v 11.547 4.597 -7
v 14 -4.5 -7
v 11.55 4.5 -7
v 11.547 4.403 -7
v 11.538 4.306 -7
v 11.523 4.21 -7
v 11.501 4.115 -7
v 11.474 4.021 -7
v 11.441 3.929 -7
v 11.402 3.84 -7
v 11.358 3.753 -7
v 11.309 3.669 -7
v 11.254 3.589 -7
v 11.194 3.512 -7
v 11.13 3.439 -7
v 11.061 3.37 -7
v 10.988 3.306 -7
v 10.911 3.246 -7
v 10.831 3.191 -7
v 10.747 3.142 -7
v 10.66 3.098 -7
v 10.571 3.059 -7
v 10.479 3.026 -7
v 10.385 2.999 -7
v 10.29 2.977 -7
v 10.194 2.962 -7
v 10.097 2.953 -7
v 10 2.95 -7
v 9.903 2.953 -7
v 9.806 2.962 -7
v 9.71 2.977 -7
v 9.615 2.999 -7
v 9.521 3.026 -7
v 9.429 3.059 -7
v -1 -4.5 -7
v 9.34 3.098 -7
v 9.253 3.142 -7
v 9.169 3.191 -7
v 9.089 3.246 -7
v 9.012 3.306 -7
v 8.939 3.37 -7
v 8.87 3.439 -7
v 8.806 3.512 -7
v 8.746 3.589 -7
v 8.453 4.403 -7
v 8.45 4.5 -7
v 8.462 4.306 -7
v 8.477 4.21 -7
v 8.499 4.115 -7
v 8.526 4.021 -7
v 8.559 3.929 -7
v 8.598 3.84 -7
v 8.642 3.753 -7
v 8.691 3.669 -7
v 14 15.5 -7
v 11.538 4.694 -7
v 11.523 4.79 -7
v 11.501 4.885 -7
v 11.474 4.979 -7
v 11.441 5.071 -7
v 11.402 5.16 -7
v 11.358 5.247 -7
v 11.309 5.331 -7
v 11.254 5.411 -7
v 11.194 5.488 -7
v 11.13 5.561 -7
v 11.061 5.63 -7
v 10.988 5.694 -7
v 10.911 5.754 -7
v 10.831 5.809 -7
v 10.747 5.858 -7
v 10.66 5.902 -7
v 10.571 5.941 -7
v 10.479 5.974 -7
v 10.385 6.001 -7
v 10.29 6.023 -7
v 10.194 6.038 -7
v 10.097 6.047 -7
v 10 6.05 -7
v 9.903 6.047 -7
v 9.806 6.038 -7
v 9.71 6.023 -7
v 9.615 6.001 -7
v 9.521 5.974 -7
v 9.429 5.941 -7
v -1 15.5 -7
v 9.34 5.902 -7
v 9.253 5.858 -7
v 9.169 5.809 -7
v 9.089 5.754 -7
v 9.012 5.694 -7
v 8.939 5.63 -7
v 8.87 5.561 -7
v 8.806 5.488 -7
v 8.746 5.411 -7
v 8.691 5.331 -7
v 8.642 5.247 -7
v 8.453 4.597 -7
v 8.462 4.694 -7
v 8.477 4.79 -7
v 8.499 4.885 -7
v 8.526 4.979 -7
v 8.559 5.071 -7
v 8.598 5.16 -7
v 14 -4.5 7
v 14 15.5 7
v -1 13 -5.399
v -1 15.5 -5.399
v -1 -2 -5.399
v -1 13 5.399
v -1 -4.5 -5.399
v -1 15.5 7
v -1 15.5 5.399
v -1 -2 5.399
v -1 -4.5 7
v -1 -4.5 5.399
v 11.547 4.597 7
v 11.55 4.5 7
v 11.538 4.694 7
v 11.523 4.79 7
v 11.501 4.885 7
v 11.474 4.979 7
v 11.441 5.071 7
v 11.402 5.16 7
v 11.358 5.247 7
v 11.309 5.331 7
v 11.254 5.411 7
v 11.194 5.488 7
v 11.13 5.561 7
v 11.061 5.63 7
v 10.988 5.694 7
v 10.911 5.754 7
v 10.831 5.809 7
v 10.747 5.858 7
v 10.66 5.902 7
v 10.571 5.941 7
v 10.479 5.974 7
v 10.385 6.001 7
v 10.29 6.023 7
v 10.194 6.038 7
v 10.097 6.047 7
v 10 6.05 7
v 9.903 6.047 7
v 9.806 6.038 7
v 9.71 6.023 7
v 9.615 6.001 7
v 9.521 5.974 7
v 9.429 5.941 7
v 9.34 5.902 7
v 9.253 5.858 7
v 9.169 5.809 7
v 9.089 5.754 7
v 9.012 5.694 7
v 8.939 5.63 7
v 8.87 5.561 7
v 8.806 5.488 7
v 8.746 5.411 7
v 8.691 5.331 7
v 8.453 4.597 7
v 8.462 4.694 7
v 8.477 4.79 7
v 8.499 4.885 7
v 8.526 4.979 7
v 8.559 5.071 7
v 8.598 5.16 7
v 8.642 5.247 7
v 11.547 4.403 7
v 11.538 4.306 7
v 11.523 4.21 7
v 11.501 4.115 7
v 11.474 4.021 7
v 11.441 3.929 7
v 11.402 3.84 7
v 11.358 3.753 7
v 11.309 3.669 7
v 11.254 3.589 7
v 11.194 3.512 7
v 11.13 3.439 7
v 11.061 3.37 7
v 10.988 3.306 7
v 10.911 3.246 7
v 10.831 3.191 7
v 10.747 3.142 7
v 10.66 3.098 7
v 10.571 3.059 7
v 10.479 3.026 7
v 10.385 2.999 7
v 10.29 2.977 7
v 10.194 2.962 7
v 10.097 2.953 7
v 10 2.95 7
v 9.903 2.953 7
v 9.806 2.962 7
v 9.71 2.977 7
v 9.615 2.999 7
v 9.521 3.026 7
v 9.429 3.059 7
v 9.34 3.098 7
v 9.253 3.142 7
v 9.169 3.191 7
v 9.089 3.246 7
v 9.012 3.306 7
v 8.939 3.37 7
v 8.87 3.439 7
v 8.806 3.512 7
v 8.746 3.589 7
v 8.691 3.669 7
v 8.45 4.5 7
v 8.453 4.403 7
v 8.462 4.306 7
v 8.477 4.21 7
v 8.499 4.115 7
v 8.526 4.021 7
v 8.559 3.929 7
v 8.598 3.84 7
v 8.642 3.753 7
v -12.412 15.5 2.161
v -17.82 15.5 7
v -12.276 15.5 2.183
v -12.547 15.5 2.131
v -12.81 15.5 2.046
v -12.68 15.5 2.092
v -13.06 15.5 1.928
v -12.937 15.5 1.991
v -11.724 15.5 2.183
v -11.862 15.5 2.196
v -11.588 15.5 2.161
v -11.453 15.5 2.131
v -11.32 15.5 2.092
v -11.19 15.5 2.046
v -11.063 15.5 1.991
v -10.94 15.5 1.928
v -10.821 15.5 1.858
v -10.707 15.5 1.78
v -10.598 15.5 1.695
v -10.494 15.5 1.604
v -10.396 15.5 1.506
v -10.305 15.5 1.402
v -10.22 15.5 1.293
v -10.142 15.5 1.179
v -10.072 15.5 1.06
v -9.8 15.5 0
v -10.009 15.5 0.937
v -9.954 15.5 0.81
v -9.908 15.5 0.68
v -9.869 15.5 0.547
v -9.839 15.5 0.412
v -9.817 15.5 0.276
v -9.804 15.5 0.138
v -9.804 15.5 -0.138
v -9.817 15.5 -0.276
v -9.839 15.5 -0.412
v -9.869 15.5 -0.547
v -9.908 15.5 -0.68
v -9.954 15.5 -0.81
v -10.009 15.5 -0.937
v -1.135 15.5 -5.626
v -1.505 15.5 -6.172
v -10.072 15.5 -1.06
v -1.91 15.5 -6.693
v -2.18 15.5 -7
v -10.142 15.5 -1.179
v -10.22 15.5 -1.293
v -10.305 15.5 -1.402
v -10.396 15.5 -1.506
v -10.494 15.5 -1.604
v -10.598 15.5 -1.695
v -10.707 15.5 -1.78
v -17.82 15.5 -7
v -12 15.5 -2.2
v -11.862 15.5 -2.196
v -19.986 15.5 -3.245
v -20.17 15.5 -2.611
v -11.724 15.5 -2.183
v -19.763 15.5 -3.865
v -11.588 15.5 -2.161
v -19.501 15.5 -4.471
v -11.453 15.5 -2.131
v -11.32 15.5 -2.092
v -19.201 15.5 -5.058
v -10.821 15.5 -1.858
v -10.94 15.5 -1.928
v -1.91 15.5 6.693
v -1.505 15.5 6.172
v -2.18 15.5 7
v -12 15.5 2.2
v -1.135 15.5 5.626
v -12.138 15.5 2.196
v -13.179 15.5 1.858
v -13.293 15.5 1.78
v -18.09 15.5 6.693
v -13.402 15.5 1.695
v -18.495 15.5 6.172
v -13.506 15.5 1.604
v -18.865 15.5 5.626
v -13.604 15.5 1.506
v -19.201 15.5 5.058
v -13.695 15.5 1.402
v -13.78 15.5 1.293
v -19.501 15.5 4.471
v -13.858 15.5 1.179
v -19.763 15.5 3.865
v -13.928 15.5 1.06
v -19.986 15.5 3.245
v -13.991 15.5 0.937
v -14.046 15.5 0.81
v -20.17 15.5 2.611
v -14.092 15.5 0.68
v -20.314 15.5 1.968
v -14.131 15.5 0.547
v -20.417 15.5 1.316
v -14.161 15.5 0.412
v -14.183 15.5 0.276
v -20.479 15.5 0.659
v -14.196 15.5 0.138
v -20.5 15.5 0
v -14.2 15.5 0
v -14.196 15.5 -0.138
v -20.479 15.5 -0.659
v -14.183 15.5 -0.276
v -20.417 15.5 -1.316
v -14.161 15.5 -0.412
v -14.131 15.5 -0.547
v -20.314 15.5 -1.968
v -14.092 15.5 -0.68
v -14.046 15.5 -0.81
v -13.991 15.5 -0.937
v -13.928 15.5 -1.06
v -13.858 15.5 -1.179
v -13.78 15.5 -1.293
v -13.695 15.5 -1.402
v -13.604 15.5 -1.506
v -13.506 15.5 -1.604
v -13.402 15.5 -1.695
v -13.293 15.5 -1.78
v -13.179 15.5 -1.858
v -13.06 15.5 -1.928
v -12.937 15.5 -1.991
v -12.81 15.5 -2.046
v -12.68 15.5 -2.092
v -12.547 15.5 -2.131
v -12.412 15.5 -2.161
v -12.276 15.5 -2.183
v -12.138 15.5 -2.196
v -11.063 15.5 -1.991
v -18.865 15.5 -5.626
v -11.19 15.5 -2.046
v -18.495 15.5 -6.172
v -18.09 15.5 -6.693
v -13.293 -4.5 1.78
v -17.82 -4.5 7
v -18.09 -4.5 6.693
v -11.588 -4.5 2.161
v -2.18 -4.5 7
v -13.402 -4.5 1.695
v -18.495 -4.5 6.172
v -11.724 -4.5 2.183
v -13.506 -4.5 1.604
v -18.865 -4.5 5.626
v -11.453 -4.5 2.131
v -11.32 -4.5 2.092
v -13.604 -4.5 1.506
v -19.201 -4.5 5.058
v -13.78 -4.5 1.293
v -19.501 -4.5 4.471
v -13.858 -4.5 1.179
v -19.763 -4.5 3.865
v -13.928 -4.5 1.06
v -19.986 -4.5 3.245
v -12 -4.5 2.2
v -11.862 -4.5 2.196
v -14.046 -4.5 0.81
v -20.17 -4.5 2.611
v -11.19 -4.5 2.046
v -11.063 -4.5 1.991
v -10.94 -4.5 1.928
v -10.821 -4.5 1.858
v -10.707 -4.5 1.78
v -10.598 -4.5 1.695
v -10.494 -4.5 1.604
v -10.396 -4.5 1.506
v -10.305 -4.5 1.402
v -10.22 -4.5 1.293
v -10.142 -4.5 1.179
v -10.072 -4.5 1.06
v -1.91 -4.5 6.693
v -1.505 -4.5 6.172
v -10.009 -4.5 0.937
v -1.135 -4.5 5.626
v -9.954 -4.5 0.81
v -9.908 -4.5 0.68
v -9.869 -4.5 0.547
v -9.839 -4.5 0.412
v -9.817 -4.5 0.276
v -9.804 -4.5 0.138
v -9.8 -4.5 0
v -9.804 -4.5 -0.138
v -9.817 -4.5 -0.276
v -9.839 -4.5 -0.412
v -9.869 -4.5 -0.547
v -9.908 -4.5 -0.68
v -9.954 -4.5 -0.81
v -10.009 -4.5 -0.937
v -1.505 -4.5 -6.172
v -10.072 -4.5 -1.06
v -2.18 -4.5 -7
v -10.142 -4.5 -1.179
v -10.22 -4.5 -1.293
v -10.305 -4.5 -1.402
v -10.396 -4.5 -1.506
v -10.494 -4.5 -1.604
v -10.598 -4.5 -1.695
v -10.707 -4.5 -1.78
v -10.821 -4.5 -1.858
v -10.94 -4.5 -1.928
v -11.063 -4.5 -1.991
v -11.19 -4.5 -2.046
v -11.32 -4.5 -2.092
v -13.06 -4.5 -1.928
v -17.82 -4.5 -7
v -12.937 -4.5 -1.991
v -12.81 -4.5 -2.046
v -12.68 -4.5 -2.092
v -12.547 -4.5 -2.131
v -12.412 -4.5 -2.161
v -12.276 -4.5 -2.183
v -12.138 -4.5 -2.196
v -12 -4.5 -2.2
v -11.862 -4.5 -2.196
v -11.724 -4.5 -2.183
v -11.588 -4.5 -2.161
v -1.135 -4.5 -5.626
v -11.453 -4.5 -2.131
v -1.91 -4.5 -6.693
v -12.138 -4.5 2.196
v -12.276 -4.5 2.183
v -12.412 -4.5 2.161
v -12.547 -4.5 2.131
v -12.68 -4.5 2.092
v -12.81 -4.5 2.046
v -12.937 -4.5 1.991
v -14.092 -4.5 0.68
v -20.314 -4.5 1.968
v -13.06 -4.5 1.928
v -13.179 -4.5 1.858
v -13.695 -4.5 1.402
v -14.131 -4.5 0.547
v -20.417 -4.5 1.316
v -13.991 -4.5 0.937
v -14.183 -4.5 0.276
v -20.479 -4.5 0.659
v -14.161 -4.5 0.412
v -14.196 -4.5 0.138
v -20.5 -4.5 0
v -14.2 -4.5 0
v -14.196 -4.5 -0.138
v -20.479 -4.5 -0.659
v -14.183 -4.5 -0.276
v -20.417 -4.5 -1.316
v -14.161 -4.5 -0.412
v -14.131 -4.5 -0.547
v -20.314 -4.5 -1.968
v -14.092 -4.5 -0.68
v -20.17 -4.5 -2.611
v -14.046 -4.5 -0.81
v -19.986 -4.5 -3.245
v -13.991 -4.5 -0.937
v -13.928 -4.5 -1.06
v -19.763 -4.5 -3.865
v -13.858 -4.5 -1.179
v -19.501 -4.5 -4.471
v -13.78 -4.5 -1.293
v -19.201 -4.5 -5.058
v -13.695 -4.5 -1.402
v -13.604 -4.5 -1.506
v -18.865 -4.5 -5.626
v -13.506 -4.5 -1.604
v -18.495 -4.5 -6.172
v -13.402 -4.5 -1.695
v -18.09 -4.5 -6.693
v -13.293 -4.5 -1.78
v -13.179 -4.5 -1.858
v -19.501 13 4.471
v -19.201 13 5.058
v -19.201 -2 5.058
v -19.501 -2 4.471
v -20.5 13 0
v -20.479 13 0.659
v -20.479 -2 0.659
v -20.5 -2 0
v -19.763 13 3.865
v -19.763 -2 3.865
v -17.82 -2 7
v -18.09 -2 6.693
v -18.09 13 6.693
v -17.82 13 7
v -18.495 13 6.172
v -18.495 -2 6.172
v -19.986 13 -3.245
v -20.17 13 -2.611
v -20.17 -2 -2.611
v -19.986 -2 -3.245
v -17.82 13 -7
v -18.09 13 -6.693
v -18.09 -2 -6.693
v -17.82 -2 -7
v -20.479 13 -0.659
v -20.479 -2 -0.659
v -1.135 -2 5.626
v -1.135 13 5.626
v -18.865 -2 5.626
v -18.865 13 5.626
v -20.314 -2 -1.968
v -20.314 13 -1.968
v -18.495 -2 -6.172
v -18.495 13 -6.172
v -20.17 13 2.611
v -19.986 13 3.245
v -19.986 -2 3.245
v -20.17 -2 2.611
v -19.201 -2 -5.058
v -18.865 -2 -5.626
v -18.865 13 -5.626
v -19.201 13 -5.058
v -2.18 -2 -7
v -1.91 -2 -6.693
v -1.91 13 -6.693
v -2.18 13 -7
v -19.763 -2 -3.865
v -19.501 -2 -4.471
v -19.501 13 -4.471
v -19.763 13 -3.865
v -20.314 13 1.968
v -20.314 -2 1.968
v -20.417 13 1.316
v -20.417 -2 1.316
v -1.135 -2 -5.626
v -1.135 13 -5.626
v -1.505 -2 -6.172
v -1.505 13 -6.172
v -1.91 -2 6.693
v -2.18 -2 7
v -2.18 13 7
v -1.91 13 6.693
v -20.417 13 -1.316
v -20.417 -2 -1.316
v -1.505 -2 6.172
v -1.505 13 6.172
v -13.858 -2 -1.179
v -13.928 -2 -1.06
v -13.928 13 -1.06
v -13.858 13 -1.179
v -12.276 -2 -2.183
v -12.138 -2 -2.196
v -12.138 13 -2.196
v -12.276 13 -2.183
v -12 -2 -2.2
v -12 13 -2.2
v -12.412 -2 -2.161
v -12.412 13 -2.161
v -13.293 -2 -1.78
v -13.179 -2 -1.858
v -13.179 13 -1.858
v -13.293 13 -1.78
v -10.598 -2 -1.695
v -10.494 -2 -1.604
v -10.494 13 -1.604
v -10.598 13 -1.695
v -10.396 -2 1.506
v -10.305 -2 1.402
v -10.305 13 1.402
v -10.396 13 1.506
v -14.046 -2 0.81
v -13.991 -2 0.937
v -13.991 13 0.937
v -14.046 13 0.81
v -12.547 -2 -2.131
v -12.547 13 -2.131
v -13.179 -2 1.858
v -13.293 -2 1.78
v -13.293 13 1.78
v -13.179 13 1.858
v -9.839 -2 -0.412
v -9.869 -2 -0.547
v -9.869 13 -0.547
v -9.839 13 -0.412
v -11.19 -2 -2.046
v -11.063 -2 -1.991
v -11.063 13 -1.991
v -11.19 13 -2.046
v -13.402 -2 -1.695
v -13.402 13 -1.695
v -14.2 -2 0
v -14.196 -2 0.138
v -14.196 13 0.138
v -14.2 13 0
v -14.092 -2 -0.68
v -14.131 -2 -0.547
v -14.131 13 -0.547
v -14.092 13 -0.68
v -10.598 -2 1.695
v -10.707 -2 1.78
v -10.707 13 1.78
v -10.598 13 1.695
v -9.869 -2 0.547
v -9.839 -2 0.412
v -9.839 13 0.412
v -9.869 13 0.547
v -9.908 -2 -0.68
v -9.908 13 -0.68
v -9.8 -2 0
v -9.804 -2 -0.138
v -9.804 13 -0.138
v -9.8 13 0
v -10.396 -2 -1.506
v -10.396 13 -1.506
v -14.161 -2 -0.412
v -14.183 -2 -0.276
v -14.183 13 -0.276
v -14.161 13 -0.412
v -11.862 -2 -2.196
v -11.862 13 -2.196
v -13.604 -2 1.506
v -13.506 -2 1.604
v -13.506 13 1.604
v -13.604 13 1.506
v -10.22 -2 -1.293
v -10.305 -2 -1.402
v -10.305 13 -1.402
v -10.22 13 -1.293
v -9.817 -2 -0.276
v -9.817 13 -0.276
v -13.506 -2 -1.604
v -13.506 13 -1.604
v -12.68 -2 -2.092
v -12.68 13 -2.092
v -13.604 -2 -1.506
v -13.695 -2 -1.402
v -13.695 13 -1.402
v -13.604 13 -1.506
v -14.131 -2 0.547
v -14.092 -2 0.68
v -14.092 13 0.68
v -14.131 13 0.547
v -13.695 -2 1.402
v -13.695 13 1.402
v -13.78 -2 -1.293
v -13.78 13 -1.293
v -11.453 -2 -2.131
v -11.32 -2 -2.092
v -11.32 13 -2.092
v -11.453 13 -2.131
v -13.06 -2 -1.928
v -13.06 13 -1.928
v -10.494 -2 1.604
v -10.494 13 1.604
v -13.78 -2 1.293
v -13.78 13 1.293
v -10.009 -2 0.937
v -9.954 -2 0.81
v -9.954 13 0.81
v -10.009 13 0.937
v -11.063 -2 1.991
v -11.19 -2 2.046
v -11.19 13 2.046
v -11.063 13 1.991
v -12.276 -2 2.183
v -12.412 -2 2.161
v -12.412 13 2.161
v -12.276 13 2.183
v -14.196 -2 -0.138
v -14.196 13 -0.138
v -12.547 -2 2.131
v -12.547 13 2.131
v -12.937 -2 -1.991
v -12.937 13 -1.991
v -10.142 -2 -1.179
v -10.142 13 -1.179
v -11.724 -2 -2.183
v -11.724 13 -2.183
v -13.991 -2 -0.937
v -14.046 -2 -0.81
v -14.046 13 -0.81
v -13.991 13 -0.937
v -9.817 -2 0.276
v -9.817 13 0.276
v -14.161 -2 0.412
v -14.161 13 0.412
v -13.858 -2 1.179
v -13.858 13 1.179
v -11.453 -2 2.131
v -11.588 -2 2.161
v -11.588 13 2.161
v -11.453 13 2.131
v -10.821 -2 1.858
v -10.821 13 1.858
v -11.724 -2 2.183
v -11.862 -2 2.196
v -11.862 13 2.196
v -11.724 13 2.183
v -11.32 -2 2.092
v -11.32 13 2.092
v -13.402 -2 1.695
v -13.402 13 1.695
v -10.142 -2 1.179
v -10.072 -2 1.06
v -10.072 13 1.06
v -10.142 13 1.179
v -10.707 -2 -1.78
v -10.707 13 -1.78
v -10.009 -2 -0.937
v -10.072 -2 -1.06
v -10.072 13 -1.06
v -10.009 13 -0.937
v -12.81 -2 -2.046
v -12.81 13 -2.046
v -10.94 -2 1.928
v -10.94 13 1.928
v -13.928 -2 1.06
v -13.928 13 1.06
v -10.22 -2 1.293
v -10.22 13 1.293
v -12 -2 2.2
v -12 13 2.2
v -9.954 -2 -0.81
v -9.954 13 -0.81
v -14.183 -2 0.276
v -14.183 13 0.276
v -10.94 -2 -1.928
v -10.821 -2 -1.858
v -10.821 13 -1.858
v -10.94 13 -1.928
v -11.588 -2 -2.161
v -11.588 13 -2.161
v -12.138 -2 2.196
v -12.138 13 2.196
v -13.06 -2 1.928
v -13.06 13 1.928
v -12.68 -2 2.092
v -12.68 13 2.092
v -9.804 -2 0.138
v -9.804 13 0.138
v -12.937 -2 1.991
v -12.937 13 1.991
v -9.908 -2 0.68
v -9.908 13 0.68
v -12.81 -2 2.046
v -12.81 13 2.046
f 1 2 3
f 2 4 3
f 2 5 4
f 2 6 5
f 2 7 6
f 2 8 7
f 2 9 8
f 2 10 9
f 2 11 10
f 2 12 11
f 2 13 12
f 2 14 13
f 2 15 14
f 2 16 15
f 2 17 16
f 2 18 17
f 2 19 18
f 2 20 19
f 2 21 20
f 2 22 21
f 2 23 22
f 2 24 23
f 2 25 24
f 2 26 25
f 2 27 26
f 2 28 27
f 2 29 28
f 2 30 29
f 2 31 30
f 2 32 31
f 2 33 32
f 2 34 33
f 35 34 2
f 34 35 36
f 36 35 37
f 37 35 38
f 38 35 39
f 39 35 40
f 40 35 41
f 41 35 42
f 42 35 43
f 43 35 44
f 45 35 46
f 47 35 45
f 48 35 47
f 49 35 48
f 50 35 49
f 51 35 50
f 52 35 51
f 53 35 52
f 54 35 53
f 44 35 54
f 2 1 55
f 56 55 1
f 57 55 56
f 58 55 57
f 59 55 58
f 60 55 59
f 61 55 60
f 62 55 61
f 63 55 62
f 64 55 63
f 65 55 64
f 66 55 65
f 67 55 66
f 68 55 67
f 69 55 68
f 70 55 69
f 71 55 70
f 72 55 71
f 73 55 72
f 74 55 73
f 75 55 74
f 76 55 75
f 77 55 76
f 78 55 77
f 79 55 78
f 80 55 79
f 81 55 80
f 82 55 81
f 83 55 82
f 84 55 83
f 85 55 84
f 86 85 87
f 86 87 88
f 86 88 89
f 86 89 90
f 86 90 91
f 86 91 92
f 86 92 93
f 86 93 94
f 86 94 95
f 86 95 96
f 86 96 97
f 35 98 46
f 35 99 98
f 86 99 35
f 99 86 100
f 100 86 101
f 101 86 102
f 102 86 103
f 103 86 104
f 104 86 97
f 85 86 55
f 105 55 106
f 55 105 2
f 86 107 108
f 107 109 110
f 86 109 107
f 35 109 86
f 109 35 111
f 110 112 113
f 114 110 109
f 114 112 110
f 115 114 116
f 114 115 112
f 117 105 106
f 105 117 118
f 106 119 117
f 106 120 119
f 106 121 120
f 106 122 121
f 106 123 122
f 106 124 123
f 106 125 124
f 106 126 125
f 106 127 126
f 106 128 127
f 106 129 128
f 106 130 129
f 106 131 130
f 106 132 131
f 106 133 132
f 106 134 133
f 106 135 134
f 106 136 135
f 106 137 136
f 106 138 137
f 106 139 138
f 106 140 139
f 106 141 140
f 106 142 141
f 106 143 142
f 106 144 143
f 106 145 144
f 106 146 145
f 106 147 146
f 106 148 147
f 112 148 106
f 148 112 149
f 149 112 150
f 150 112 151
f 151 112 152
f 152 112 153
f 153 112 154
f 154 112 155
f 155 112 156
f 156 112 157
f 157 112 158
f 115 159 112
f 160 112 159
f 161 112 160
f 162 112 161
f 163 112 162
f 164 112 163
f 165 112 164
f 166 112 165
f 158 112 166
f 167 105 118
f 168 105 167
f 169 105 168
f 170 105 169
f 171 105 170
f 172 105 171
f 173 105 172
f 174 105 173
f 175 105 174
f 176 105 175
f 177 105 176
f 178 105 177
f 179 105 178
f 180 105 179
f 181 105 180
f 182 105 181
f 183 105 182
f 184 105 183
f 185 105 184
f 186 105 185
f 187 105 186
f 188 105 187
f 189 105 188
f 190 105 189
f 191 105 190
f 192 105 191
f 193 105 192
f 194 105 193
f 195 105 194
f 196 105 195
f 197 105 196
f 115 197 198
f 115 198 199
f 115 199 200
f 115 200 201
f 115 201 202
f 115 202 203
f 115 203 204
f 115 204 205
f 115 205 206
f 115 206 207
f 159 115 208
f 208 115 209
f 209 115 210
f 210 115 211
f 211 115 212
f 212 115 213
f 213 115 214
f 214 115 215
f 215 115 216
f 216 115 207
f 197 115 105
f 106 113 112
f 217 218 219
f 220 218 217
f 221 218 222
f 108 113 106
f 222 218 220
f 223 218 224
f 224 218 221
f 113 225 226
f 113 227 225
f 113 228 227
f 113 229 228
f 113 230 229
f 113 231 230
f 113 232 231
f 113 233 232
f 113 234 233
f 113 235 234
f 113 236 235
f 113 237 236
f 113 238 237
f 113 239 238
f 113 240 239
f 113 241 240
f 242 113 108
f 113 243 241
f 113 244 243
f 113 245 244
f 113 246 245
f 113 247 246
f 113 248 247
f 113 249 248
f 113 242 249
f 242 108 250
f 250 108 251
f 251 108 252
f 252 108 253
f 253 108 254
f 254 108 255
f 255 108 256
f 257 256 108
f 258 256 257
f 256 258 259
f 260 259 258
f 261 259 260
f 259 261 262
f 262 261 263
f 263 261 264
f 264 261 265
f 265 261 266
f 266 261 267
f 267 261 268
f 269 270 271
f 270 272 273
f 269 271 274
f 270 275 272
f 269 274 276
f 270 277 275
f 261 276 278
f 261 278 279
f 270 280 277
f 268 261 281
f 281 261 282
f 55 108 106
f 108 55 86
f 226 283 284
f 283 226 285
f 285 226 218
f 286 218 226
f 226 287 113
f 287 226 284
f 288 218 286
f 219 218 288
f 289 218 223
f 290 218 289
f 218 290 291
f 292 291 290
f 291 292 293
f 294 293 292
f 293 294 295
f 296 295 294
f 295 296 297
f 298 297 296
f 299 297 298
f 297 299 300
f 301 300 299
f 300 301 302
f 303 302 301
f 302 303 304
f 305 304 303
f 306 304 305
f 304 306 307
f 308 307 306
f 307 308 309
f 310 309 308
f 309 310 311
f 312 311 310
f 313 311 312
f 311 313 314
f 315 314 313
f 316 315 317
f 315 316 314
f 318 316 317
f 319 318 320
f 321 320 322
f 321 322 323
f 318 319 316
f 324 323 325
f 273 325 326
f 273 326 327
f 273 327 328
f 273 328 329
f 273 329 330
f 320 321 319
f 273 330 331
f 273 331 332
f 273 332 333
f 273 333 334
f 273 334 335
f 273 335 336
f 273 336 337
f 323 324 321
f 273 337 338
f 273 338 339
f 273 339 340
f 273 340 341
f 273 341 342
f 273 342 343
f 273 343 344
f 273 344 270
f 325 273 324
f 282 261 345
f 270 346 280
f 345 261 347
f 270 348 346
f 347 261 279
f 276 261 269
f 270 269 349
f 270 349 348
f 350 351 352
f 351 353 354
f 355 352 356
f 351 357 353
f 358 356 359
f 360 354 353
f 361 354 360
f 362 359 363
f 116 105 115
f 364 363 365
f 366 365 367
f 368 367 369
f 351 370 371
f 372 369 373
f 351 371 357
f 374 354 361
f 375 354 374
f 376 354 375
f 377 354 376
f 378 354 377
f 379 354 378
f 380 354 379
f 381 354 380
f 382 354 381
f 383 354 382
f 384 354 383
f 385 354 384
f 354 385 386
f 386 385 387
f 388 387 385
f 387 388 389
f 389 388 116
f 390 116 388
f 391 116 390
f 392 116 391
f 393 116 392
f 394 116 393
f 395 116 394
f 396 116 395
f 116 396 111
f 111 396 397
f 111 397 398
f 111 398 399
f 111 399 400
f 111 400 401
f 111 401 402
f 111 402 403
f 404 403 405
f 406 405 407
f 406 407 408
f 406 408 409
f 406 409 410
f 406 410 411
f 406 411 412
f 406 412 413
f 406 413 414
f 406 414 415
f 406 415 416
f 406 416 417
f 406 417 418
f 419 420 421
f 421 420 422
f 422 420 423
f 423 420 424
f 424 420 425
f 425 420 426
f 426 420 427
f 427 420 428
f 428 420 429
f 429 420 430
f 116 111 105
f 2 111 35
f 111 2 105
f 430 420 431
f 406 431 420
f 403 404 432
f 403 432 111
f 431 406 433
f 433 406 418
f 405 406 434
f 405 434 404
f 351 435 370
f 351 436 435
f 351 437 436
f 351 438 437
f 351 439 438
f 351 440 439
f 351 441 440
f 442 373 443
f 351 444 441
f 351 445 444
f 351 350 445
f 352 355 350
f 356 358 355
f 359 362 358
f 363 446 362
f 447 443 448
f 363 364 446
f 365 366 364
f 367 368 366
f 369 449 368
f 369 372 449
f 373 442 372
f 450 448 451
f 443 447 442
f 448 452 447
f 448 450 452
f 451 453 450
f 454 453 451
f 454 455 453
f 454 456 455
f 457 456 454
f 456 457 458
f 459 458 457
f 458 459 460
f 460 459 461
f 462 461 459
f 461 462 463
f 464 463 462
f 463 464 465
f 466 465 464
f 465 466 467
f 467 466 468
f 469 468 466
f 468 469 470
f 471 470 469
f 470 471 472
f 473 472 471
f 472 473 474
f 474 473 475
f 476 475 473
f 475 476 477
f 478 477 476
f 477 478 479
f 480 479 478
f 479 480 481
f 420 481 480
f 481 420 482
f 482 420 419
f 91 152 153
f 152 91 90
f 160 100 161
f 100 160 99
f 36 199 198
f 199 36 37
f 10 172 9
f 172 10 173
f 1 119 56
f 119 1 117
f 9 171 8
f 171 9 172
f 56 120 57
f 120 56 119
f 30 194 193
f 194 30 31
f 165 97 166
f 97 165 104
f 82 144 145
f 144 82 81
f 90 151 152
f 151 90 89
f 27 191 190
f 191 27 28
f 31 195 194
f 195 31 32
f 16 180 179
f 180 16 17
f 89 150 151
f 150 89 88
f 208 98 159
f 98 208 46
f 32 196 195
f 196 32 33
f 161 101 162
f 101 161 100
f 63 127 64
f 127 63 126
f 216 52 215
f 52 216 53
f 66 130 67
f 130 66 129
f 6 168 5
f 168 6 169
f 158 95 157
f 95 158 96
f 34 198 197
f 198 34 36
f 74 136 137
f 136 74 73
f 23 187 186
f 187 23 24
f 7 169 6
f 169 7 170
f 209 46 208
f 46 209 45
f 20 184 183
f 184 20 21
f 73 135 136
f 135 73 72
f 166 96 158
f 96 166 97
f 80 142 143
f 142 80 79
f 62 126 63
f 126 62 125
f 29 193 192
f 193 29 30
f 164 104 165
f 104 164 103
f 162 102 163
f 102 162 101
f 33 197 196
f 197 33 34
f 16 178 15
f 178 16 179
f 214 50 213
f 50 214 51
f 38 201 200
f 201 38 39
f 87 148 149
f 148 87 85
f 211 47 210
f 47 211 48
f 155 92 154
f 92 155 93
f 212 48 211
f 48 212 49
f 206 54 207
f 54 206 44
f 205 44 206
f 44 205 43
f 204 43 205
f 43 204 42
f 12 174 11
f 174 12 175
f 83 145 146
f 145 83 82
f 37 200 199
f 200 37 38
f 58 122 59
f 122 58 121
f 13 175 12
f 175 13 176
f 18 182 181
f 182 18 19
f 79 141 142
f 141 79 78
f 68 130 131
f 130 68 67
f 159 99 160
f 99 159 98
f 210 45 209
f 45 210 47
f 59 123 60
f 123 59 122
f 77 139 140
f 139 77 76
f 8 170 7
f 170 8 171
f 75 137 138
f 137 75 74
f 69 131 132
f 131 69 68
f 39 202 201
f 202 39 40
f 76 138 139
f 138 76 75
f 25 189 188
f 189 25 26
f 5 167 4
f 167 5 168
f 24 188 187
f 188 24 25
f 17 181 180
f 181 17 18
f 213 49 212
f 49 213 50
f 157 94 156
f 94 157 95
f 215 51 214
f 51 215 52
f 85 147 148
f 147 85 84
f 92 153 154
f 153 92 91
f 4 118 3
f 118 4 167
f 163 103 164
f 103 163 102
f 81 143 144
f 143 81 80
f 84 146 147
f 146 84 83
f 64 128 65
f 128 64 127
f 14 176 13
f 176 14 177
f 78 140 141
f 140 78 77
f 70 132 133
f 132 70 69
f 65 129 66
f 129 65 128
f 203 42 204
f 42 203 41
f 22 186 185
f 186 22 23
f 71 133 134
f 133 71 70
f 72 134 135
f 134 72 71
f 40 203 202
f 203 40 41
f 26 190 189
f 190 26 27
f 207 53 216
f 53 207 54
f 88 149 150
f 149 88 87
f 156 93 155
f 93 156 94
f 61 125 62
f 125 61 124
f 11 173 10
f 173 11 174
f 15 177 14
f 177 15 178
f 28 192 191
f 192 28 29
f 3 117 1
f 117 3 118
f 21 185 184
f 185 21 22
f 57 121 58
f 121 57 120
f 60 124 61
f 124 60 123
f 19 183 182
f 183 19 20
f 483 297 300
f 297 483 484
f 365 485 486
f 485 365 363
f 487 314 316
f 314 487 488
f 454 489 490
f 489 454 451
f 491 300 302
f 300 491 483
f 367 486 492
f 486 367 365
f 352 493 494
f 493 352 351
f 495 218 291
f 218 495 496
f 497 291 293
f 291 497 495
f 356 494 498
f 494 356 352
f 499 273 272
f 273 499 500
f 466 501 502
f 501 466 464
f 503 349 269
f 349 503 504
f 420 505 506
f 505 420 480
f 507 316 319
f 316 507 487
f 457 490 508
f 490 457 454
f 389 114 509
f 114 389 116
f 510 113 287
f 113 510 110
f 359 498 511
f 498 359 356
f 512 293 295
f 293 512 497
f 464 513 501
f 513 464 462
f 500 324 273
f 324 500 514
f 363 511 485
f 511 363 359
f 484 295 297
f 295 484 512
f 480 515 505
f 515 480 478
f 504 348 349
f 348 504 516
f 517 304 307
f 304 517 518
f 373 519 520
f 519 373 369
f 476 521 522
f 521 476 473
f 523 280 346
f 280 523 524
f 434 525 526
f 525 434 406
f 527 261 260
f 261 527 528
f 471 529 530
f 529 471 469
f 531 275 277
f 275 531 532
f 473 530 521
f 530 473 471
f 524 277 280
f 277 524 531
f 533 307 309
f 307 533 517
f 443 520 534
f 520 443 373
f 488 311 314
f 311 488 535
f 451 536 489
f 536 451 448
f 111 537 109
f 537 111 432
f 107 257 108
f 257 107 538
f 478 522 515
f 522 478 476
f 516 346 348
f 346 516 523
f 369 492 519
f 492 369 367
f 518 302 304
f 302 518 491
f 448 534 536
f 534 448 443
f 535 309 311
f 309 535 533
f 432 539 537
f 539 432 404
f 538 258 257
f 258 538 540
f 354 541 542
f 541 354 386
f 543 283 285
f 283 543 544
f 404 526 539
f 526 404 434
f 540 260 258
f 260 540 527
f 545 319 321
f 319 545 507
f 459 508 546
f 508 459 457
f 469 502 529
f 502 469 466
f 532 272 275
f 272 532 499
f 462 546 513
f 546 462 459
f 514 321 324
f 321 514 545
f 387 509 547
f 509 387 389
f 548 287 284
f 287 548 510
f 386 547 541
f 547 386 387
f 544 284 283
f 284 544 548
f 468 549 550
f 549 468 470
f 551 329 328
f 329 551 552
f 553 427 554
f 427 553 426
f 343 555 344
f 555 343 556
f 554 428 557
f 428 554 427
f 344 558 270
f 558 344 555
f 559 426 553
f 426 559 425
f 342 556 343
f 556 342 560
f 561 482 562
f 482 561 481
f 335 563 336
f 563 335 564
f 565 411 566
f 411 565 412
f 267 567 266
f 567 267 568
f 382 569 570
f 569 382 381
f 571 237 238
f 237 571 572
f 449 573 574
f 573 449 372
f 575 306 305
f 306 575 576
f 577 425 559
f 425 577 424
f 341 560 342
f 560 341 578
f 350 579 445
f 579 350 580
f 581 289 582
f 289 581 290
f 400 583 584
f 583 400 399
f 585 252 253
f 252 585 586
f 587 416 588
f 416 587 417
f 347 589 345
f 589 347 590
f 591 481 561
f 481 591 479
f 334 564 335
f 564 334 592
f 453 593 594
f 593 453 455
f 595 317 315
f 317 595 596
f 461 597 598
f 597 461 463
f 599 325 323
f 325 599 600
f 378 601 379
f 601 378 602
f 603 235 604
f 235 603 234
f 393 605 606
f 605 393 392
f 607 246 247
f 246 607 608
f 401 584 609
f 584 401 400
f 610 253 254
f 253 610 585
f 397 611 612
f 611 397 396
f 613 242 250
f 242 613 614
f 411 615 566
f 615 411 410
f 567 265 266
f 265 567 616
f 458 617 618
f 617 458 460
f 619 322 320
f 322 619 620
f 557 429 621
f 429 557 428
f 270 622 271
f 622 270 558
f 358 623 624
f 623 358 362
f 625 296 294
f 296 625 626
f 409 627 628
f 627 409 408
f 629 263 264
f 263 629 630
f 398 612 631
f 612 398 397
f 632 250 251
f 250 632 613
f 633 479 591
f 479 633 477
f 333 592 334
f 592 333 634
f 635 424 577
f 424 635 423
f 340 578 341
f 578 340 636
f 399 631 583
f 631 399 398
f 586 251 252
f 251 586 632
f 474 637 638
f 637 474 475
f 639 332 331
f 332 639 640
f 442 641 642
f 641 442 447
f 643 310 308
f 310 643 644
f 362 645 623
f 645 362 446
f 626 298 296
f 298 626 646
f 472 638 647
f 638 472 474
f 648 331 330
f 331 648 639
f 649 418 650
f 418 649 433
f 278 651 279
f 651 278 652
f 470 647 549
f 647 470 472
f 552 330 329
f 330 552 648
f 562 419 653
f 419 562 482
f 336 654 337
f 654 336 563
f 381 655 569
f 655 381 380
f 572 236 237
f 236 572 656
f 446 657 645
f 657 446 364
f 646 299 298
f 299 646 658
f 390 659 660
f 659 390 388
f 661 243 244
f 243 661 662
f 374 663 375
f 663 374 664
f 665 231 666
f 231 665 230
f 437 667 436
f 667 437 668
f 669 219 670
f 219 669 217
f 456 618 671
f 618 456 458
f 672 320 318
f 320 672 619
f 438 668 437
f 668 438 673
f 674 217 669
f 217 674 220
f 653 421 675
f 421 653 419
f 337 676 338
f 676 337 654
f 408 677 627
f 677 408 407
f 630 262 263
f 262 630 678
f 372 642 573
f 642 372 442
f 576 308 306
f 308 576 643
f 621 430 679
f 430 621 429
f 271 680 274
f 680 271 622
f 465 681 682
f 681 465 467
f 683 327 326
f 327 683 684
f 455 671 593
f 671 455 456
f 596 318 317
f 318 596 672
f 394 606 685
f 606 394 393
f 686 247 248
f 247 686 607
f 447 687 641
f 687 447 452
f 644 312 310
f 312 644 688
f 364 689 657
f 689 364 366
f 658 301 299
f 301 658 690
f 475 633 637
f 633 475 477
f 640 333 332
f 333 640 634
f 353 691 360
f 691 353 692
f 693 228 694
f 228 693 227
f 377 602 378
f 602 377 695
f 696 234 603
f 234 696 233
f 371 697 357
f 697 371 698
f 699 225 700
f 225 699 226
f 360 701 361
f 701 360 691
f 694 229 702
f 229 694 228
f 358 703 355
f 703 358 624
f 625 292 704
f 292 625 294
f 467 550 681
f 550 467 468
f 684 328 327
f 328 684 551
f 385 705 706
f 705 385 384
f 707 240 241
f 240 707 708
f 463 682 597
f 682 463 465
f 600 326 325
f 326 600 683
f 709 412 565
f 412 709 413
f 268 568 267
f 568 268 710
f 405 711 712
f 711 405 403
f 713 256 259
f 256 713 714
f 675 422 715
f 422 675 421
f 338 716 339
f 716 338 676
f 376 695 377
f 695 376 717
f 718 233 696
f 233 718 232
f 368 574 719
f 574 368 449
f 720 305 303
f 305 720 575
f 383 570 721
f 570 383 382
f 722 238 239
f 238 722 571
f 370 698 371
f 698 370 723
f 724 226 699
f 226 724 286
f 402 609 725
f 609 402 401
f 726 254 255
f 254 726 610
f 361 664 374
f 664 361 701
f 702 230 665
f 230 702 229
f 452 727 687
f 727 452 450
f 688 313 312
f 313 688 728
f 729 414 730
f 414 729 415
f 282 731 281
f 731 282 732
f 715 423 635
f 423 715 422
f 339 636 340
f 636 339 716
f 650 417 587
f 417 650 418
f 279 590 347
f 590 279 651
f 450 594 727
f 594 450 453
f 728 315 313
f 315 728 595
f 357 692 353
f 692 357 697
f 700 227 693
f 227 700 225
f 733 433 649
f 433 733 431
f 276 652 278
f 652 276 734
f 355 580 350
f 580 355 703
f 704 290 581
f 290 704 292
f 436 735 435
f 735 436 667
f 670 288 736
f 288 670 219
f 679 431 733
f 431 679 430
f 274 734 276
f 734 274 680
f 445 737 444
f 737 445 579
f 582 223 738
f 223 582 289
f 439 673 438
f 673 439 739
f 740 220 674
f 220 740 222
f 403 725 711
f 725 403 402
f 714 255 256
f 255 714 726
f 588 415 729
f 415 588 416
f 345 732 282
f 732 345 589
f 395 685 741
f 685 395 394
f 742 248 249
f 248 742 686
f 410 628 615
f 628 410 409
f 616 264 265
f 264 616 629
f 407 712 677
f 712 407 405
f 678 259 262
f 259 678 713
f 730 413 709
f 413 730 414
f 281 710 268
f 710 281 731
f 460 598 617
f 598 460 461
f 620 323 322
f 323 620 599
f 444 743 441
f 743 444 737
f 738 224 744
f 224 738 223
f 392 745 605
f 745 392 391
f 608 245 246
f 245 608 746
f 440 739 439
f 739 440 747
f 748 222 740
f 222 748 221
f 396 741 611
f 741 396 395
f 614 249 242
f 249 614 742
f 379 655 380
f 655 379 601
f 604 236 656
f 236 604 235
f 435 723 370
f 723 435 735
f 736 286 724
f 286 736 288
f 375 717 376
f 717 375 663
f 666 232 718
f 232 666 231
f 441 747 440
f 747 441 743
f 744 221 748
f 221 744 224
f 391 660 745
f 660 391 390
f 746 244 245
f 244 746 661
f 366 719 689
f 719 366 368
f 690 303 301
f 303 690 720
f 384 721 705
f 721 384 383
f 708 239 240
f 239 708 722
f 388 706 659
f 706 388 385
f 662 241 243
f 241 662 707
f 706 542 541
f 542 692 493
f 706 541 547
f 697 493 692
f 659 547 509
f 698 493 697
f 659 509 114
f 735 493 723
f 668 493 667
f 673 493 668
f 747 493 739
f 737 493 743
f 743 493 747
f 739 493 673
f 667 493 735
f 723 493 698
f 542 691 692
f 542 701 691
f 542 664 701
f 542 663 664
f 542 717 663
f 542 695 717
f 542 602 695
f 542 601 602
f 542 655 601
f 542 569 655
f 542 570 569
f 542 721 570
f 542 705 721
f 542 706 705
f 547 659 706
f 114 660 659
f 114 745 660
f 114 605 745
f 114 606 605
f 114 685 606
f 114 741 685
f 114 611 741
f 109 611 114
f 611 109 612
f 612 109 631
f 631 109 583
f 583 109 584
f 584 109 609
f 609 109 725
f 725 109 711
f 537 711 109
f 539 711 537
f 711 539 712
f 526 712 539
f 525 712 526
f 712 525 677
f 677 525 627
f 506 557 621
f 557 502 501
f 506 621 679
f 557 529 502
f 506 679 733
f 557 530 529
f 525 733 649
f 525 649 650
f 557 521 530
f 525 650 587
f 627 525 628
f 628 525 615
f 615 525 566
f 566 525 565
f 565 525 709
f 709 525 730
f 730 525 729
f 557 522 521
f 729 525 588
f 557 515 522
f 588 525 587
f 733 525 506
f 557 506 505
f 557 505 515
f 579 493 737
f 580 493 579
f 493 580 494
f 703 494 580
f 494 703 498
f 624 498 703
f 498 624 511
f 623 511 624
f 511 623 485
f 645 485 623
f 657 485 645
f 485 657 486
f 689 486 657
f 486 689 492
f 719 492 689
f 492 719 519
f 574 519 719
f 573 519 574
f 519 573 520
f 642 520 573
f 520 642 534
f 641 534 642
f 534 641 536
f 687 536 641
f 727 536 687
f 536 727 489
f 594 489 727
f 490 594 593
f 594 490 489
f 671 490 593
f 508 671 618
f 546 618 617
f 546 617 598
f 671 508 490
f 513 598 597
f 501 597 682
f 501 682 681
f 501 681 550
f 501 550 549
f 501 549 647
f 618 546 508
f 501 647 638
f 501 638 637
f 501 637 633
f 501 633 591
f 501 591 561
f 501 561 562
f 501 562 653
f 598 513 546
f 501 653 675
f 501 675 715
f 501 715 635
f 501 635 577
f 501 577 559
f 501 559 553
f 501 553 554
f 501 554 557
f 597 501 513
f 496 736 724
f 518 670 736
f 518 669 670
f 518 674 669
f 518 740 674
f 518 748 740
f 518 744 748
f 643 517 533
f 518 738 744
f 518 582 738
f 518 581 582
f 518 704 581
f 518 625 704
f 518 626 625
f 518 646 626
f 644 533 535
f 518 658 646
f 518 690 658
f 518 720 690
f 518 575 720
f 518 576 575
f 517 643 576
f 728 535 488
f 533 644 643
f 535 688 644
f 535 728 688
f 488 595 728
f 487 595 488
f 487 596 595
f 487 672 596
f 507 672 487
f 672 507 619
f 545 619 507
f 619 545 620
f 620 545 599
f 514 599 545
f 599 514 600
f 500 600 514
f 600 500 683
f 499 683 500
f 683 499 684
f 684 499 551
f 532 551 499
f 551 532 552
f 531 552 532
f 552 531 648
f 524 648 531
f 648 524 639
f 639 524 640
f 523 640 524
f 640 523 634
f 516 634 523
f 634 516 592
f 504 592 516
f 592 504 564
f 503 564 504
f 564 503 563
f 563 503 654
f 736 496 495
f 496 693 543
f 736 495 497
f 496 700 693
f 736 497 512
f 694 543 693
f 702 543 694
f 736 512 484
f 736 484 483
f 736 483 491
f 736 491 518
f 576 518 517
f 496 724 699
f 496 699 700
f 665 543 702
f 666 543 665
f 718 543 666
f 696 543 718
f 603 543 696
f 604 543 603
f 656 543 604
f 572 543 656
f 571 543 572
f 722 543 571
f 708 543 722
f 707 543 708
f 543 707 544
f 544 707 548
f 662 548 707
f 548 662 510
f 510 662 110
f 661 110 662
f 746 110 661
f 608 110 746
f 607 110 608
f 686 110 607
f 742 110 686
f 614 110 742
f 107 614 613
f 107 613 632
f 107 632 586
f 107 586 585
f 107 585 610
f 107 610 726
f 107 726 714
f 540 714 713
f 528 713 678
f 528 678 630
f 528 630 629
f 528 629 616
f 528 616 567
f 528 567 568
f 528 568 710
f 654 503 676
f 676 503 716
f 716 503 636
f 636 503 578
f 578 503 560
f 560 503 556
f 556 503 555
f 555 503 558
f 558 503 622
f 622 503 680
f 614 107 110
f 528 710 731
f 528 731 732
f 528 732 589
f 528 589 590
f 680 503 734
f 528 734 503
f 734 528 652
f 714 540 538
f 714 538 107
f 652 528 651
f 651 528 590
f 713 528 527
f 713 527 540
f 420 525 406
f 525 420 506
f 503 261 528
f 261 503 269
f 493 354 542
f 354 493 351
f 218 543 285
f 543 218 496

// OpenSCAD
$fn=100;
//25
//30
//60
//120
module finger_tip(length=15){

difference(){
translate([-14/2,-4.5,-1])cube([14,20,length]);
#translate([-10,4.5,length-5])rotate([0,90,0])cylinder(r=3.1/2,h=30);

}
translate([0,-4.5,-10])rotate([-90,0,0])outer_joint();

}





module inner_joint(bearing_size=13,bearing_width=5){
difference(){
union(){
hull(){
cylinder(r=(bearing_size+4)/2,h=bearing_width);
translate([0,0,5])cylinder(r=(bearing_size-5)/2,h=bearing_width);
}
hull(){
translate([0,0,10])cylinder(r=(bearing_size+4)/2,h=bearing_width);
translate([0,0,5])cylinder(r=(bearing_size-5)/2,h=bearing_width);
}
}
#translate([0,0,-1])cylinder(r=4/2,h=20);
translate([7,-19,0])cube([5,25,30]);
translate([-12,-10,0])cube([5,25,30]);
}
}

module outer_joint(bearing_size=13,bearing_width=5){
difference(){
cylinder(r=(bearing_size+8)/2,h=bearing_width+15);
#translate([0,2,0])cylinder(r=4.4/2,h=30);
translate([0,0,2.5])cylinder(r=22/2,h=15);


translate([7,-10,0])cube([5,25,30]);
translate([-12,-10,0])cube([5,25,30]);
}
translate([-5/2,-14.5,0])cube([5,5,20]);
}

module intermediate_bone(length=25){
union(){
difference(){
translate([-17/2,-2,-1])cube([14,20,length]);
#translate([-8,8,length-25])rotate([0,0,0])cylinder(r=4/2,h=30);
#translate([5,8,length-25])rotate([0,-0,0])cylinder(r=4/2,h=30);

}

translate([-1.5,0.5,length+6.5])rotate([-90,0,0])inner_joint();
translate([-1.5,-2,-9])rotate([-90,0,0])outer_joint();
}

}

module proximal_bone(length=60){
difference(){
translate([-17/2,-2,-1])cube([17,5,length]);
#translate([-10,0.5,-length+50])rotate([0,25,0])cylinder(r=3.1/2,h=length);
#translate([10,0.5,length-50])rotate([0,-25,0])cylinder(r=3.1/2,h=length);
#translate([0,-3,length])rotate([-90,0,0])cylinder(r=13/2,h=7);

}
translate([0,-4.5,-10])rotate([-90,0,0])outer_joint();
translate([0,-2,length])rotate([-90,0,0])inner_joint();

}

module metacarpal_bone(length=60){
difference(){
translate([-17/2,-2,-1])cube([17,5,length]);
#translate([-10,0.5,-length+80])rotate([0,15,0])cylinder(r=3.1/2,h=length);
#translate([10,0.5,length-80])rotate([0,-15,0])cylinder(r=3.1/2,h=length);
#translate([0,-3,length])rotate([-90,0,0])cylinder(r=13/2,h=7);
}
translate([0,-4.5,-10])rotate([-90,0,0])outer_joint();
translate([0,-2,length])rotate([-90,0,0])inner_joint();

}

//rotate([0,90,0])metacarpal_bone(80);
//rotate([0,90,0])proximal_bone(50);
//rotate([0,90,0])intermediate_bone(22);
rotate([0,90,0])finger_tip();
//translate([0,0,2])inner_joint();
//rotate([0,90,0])outer_joint();
